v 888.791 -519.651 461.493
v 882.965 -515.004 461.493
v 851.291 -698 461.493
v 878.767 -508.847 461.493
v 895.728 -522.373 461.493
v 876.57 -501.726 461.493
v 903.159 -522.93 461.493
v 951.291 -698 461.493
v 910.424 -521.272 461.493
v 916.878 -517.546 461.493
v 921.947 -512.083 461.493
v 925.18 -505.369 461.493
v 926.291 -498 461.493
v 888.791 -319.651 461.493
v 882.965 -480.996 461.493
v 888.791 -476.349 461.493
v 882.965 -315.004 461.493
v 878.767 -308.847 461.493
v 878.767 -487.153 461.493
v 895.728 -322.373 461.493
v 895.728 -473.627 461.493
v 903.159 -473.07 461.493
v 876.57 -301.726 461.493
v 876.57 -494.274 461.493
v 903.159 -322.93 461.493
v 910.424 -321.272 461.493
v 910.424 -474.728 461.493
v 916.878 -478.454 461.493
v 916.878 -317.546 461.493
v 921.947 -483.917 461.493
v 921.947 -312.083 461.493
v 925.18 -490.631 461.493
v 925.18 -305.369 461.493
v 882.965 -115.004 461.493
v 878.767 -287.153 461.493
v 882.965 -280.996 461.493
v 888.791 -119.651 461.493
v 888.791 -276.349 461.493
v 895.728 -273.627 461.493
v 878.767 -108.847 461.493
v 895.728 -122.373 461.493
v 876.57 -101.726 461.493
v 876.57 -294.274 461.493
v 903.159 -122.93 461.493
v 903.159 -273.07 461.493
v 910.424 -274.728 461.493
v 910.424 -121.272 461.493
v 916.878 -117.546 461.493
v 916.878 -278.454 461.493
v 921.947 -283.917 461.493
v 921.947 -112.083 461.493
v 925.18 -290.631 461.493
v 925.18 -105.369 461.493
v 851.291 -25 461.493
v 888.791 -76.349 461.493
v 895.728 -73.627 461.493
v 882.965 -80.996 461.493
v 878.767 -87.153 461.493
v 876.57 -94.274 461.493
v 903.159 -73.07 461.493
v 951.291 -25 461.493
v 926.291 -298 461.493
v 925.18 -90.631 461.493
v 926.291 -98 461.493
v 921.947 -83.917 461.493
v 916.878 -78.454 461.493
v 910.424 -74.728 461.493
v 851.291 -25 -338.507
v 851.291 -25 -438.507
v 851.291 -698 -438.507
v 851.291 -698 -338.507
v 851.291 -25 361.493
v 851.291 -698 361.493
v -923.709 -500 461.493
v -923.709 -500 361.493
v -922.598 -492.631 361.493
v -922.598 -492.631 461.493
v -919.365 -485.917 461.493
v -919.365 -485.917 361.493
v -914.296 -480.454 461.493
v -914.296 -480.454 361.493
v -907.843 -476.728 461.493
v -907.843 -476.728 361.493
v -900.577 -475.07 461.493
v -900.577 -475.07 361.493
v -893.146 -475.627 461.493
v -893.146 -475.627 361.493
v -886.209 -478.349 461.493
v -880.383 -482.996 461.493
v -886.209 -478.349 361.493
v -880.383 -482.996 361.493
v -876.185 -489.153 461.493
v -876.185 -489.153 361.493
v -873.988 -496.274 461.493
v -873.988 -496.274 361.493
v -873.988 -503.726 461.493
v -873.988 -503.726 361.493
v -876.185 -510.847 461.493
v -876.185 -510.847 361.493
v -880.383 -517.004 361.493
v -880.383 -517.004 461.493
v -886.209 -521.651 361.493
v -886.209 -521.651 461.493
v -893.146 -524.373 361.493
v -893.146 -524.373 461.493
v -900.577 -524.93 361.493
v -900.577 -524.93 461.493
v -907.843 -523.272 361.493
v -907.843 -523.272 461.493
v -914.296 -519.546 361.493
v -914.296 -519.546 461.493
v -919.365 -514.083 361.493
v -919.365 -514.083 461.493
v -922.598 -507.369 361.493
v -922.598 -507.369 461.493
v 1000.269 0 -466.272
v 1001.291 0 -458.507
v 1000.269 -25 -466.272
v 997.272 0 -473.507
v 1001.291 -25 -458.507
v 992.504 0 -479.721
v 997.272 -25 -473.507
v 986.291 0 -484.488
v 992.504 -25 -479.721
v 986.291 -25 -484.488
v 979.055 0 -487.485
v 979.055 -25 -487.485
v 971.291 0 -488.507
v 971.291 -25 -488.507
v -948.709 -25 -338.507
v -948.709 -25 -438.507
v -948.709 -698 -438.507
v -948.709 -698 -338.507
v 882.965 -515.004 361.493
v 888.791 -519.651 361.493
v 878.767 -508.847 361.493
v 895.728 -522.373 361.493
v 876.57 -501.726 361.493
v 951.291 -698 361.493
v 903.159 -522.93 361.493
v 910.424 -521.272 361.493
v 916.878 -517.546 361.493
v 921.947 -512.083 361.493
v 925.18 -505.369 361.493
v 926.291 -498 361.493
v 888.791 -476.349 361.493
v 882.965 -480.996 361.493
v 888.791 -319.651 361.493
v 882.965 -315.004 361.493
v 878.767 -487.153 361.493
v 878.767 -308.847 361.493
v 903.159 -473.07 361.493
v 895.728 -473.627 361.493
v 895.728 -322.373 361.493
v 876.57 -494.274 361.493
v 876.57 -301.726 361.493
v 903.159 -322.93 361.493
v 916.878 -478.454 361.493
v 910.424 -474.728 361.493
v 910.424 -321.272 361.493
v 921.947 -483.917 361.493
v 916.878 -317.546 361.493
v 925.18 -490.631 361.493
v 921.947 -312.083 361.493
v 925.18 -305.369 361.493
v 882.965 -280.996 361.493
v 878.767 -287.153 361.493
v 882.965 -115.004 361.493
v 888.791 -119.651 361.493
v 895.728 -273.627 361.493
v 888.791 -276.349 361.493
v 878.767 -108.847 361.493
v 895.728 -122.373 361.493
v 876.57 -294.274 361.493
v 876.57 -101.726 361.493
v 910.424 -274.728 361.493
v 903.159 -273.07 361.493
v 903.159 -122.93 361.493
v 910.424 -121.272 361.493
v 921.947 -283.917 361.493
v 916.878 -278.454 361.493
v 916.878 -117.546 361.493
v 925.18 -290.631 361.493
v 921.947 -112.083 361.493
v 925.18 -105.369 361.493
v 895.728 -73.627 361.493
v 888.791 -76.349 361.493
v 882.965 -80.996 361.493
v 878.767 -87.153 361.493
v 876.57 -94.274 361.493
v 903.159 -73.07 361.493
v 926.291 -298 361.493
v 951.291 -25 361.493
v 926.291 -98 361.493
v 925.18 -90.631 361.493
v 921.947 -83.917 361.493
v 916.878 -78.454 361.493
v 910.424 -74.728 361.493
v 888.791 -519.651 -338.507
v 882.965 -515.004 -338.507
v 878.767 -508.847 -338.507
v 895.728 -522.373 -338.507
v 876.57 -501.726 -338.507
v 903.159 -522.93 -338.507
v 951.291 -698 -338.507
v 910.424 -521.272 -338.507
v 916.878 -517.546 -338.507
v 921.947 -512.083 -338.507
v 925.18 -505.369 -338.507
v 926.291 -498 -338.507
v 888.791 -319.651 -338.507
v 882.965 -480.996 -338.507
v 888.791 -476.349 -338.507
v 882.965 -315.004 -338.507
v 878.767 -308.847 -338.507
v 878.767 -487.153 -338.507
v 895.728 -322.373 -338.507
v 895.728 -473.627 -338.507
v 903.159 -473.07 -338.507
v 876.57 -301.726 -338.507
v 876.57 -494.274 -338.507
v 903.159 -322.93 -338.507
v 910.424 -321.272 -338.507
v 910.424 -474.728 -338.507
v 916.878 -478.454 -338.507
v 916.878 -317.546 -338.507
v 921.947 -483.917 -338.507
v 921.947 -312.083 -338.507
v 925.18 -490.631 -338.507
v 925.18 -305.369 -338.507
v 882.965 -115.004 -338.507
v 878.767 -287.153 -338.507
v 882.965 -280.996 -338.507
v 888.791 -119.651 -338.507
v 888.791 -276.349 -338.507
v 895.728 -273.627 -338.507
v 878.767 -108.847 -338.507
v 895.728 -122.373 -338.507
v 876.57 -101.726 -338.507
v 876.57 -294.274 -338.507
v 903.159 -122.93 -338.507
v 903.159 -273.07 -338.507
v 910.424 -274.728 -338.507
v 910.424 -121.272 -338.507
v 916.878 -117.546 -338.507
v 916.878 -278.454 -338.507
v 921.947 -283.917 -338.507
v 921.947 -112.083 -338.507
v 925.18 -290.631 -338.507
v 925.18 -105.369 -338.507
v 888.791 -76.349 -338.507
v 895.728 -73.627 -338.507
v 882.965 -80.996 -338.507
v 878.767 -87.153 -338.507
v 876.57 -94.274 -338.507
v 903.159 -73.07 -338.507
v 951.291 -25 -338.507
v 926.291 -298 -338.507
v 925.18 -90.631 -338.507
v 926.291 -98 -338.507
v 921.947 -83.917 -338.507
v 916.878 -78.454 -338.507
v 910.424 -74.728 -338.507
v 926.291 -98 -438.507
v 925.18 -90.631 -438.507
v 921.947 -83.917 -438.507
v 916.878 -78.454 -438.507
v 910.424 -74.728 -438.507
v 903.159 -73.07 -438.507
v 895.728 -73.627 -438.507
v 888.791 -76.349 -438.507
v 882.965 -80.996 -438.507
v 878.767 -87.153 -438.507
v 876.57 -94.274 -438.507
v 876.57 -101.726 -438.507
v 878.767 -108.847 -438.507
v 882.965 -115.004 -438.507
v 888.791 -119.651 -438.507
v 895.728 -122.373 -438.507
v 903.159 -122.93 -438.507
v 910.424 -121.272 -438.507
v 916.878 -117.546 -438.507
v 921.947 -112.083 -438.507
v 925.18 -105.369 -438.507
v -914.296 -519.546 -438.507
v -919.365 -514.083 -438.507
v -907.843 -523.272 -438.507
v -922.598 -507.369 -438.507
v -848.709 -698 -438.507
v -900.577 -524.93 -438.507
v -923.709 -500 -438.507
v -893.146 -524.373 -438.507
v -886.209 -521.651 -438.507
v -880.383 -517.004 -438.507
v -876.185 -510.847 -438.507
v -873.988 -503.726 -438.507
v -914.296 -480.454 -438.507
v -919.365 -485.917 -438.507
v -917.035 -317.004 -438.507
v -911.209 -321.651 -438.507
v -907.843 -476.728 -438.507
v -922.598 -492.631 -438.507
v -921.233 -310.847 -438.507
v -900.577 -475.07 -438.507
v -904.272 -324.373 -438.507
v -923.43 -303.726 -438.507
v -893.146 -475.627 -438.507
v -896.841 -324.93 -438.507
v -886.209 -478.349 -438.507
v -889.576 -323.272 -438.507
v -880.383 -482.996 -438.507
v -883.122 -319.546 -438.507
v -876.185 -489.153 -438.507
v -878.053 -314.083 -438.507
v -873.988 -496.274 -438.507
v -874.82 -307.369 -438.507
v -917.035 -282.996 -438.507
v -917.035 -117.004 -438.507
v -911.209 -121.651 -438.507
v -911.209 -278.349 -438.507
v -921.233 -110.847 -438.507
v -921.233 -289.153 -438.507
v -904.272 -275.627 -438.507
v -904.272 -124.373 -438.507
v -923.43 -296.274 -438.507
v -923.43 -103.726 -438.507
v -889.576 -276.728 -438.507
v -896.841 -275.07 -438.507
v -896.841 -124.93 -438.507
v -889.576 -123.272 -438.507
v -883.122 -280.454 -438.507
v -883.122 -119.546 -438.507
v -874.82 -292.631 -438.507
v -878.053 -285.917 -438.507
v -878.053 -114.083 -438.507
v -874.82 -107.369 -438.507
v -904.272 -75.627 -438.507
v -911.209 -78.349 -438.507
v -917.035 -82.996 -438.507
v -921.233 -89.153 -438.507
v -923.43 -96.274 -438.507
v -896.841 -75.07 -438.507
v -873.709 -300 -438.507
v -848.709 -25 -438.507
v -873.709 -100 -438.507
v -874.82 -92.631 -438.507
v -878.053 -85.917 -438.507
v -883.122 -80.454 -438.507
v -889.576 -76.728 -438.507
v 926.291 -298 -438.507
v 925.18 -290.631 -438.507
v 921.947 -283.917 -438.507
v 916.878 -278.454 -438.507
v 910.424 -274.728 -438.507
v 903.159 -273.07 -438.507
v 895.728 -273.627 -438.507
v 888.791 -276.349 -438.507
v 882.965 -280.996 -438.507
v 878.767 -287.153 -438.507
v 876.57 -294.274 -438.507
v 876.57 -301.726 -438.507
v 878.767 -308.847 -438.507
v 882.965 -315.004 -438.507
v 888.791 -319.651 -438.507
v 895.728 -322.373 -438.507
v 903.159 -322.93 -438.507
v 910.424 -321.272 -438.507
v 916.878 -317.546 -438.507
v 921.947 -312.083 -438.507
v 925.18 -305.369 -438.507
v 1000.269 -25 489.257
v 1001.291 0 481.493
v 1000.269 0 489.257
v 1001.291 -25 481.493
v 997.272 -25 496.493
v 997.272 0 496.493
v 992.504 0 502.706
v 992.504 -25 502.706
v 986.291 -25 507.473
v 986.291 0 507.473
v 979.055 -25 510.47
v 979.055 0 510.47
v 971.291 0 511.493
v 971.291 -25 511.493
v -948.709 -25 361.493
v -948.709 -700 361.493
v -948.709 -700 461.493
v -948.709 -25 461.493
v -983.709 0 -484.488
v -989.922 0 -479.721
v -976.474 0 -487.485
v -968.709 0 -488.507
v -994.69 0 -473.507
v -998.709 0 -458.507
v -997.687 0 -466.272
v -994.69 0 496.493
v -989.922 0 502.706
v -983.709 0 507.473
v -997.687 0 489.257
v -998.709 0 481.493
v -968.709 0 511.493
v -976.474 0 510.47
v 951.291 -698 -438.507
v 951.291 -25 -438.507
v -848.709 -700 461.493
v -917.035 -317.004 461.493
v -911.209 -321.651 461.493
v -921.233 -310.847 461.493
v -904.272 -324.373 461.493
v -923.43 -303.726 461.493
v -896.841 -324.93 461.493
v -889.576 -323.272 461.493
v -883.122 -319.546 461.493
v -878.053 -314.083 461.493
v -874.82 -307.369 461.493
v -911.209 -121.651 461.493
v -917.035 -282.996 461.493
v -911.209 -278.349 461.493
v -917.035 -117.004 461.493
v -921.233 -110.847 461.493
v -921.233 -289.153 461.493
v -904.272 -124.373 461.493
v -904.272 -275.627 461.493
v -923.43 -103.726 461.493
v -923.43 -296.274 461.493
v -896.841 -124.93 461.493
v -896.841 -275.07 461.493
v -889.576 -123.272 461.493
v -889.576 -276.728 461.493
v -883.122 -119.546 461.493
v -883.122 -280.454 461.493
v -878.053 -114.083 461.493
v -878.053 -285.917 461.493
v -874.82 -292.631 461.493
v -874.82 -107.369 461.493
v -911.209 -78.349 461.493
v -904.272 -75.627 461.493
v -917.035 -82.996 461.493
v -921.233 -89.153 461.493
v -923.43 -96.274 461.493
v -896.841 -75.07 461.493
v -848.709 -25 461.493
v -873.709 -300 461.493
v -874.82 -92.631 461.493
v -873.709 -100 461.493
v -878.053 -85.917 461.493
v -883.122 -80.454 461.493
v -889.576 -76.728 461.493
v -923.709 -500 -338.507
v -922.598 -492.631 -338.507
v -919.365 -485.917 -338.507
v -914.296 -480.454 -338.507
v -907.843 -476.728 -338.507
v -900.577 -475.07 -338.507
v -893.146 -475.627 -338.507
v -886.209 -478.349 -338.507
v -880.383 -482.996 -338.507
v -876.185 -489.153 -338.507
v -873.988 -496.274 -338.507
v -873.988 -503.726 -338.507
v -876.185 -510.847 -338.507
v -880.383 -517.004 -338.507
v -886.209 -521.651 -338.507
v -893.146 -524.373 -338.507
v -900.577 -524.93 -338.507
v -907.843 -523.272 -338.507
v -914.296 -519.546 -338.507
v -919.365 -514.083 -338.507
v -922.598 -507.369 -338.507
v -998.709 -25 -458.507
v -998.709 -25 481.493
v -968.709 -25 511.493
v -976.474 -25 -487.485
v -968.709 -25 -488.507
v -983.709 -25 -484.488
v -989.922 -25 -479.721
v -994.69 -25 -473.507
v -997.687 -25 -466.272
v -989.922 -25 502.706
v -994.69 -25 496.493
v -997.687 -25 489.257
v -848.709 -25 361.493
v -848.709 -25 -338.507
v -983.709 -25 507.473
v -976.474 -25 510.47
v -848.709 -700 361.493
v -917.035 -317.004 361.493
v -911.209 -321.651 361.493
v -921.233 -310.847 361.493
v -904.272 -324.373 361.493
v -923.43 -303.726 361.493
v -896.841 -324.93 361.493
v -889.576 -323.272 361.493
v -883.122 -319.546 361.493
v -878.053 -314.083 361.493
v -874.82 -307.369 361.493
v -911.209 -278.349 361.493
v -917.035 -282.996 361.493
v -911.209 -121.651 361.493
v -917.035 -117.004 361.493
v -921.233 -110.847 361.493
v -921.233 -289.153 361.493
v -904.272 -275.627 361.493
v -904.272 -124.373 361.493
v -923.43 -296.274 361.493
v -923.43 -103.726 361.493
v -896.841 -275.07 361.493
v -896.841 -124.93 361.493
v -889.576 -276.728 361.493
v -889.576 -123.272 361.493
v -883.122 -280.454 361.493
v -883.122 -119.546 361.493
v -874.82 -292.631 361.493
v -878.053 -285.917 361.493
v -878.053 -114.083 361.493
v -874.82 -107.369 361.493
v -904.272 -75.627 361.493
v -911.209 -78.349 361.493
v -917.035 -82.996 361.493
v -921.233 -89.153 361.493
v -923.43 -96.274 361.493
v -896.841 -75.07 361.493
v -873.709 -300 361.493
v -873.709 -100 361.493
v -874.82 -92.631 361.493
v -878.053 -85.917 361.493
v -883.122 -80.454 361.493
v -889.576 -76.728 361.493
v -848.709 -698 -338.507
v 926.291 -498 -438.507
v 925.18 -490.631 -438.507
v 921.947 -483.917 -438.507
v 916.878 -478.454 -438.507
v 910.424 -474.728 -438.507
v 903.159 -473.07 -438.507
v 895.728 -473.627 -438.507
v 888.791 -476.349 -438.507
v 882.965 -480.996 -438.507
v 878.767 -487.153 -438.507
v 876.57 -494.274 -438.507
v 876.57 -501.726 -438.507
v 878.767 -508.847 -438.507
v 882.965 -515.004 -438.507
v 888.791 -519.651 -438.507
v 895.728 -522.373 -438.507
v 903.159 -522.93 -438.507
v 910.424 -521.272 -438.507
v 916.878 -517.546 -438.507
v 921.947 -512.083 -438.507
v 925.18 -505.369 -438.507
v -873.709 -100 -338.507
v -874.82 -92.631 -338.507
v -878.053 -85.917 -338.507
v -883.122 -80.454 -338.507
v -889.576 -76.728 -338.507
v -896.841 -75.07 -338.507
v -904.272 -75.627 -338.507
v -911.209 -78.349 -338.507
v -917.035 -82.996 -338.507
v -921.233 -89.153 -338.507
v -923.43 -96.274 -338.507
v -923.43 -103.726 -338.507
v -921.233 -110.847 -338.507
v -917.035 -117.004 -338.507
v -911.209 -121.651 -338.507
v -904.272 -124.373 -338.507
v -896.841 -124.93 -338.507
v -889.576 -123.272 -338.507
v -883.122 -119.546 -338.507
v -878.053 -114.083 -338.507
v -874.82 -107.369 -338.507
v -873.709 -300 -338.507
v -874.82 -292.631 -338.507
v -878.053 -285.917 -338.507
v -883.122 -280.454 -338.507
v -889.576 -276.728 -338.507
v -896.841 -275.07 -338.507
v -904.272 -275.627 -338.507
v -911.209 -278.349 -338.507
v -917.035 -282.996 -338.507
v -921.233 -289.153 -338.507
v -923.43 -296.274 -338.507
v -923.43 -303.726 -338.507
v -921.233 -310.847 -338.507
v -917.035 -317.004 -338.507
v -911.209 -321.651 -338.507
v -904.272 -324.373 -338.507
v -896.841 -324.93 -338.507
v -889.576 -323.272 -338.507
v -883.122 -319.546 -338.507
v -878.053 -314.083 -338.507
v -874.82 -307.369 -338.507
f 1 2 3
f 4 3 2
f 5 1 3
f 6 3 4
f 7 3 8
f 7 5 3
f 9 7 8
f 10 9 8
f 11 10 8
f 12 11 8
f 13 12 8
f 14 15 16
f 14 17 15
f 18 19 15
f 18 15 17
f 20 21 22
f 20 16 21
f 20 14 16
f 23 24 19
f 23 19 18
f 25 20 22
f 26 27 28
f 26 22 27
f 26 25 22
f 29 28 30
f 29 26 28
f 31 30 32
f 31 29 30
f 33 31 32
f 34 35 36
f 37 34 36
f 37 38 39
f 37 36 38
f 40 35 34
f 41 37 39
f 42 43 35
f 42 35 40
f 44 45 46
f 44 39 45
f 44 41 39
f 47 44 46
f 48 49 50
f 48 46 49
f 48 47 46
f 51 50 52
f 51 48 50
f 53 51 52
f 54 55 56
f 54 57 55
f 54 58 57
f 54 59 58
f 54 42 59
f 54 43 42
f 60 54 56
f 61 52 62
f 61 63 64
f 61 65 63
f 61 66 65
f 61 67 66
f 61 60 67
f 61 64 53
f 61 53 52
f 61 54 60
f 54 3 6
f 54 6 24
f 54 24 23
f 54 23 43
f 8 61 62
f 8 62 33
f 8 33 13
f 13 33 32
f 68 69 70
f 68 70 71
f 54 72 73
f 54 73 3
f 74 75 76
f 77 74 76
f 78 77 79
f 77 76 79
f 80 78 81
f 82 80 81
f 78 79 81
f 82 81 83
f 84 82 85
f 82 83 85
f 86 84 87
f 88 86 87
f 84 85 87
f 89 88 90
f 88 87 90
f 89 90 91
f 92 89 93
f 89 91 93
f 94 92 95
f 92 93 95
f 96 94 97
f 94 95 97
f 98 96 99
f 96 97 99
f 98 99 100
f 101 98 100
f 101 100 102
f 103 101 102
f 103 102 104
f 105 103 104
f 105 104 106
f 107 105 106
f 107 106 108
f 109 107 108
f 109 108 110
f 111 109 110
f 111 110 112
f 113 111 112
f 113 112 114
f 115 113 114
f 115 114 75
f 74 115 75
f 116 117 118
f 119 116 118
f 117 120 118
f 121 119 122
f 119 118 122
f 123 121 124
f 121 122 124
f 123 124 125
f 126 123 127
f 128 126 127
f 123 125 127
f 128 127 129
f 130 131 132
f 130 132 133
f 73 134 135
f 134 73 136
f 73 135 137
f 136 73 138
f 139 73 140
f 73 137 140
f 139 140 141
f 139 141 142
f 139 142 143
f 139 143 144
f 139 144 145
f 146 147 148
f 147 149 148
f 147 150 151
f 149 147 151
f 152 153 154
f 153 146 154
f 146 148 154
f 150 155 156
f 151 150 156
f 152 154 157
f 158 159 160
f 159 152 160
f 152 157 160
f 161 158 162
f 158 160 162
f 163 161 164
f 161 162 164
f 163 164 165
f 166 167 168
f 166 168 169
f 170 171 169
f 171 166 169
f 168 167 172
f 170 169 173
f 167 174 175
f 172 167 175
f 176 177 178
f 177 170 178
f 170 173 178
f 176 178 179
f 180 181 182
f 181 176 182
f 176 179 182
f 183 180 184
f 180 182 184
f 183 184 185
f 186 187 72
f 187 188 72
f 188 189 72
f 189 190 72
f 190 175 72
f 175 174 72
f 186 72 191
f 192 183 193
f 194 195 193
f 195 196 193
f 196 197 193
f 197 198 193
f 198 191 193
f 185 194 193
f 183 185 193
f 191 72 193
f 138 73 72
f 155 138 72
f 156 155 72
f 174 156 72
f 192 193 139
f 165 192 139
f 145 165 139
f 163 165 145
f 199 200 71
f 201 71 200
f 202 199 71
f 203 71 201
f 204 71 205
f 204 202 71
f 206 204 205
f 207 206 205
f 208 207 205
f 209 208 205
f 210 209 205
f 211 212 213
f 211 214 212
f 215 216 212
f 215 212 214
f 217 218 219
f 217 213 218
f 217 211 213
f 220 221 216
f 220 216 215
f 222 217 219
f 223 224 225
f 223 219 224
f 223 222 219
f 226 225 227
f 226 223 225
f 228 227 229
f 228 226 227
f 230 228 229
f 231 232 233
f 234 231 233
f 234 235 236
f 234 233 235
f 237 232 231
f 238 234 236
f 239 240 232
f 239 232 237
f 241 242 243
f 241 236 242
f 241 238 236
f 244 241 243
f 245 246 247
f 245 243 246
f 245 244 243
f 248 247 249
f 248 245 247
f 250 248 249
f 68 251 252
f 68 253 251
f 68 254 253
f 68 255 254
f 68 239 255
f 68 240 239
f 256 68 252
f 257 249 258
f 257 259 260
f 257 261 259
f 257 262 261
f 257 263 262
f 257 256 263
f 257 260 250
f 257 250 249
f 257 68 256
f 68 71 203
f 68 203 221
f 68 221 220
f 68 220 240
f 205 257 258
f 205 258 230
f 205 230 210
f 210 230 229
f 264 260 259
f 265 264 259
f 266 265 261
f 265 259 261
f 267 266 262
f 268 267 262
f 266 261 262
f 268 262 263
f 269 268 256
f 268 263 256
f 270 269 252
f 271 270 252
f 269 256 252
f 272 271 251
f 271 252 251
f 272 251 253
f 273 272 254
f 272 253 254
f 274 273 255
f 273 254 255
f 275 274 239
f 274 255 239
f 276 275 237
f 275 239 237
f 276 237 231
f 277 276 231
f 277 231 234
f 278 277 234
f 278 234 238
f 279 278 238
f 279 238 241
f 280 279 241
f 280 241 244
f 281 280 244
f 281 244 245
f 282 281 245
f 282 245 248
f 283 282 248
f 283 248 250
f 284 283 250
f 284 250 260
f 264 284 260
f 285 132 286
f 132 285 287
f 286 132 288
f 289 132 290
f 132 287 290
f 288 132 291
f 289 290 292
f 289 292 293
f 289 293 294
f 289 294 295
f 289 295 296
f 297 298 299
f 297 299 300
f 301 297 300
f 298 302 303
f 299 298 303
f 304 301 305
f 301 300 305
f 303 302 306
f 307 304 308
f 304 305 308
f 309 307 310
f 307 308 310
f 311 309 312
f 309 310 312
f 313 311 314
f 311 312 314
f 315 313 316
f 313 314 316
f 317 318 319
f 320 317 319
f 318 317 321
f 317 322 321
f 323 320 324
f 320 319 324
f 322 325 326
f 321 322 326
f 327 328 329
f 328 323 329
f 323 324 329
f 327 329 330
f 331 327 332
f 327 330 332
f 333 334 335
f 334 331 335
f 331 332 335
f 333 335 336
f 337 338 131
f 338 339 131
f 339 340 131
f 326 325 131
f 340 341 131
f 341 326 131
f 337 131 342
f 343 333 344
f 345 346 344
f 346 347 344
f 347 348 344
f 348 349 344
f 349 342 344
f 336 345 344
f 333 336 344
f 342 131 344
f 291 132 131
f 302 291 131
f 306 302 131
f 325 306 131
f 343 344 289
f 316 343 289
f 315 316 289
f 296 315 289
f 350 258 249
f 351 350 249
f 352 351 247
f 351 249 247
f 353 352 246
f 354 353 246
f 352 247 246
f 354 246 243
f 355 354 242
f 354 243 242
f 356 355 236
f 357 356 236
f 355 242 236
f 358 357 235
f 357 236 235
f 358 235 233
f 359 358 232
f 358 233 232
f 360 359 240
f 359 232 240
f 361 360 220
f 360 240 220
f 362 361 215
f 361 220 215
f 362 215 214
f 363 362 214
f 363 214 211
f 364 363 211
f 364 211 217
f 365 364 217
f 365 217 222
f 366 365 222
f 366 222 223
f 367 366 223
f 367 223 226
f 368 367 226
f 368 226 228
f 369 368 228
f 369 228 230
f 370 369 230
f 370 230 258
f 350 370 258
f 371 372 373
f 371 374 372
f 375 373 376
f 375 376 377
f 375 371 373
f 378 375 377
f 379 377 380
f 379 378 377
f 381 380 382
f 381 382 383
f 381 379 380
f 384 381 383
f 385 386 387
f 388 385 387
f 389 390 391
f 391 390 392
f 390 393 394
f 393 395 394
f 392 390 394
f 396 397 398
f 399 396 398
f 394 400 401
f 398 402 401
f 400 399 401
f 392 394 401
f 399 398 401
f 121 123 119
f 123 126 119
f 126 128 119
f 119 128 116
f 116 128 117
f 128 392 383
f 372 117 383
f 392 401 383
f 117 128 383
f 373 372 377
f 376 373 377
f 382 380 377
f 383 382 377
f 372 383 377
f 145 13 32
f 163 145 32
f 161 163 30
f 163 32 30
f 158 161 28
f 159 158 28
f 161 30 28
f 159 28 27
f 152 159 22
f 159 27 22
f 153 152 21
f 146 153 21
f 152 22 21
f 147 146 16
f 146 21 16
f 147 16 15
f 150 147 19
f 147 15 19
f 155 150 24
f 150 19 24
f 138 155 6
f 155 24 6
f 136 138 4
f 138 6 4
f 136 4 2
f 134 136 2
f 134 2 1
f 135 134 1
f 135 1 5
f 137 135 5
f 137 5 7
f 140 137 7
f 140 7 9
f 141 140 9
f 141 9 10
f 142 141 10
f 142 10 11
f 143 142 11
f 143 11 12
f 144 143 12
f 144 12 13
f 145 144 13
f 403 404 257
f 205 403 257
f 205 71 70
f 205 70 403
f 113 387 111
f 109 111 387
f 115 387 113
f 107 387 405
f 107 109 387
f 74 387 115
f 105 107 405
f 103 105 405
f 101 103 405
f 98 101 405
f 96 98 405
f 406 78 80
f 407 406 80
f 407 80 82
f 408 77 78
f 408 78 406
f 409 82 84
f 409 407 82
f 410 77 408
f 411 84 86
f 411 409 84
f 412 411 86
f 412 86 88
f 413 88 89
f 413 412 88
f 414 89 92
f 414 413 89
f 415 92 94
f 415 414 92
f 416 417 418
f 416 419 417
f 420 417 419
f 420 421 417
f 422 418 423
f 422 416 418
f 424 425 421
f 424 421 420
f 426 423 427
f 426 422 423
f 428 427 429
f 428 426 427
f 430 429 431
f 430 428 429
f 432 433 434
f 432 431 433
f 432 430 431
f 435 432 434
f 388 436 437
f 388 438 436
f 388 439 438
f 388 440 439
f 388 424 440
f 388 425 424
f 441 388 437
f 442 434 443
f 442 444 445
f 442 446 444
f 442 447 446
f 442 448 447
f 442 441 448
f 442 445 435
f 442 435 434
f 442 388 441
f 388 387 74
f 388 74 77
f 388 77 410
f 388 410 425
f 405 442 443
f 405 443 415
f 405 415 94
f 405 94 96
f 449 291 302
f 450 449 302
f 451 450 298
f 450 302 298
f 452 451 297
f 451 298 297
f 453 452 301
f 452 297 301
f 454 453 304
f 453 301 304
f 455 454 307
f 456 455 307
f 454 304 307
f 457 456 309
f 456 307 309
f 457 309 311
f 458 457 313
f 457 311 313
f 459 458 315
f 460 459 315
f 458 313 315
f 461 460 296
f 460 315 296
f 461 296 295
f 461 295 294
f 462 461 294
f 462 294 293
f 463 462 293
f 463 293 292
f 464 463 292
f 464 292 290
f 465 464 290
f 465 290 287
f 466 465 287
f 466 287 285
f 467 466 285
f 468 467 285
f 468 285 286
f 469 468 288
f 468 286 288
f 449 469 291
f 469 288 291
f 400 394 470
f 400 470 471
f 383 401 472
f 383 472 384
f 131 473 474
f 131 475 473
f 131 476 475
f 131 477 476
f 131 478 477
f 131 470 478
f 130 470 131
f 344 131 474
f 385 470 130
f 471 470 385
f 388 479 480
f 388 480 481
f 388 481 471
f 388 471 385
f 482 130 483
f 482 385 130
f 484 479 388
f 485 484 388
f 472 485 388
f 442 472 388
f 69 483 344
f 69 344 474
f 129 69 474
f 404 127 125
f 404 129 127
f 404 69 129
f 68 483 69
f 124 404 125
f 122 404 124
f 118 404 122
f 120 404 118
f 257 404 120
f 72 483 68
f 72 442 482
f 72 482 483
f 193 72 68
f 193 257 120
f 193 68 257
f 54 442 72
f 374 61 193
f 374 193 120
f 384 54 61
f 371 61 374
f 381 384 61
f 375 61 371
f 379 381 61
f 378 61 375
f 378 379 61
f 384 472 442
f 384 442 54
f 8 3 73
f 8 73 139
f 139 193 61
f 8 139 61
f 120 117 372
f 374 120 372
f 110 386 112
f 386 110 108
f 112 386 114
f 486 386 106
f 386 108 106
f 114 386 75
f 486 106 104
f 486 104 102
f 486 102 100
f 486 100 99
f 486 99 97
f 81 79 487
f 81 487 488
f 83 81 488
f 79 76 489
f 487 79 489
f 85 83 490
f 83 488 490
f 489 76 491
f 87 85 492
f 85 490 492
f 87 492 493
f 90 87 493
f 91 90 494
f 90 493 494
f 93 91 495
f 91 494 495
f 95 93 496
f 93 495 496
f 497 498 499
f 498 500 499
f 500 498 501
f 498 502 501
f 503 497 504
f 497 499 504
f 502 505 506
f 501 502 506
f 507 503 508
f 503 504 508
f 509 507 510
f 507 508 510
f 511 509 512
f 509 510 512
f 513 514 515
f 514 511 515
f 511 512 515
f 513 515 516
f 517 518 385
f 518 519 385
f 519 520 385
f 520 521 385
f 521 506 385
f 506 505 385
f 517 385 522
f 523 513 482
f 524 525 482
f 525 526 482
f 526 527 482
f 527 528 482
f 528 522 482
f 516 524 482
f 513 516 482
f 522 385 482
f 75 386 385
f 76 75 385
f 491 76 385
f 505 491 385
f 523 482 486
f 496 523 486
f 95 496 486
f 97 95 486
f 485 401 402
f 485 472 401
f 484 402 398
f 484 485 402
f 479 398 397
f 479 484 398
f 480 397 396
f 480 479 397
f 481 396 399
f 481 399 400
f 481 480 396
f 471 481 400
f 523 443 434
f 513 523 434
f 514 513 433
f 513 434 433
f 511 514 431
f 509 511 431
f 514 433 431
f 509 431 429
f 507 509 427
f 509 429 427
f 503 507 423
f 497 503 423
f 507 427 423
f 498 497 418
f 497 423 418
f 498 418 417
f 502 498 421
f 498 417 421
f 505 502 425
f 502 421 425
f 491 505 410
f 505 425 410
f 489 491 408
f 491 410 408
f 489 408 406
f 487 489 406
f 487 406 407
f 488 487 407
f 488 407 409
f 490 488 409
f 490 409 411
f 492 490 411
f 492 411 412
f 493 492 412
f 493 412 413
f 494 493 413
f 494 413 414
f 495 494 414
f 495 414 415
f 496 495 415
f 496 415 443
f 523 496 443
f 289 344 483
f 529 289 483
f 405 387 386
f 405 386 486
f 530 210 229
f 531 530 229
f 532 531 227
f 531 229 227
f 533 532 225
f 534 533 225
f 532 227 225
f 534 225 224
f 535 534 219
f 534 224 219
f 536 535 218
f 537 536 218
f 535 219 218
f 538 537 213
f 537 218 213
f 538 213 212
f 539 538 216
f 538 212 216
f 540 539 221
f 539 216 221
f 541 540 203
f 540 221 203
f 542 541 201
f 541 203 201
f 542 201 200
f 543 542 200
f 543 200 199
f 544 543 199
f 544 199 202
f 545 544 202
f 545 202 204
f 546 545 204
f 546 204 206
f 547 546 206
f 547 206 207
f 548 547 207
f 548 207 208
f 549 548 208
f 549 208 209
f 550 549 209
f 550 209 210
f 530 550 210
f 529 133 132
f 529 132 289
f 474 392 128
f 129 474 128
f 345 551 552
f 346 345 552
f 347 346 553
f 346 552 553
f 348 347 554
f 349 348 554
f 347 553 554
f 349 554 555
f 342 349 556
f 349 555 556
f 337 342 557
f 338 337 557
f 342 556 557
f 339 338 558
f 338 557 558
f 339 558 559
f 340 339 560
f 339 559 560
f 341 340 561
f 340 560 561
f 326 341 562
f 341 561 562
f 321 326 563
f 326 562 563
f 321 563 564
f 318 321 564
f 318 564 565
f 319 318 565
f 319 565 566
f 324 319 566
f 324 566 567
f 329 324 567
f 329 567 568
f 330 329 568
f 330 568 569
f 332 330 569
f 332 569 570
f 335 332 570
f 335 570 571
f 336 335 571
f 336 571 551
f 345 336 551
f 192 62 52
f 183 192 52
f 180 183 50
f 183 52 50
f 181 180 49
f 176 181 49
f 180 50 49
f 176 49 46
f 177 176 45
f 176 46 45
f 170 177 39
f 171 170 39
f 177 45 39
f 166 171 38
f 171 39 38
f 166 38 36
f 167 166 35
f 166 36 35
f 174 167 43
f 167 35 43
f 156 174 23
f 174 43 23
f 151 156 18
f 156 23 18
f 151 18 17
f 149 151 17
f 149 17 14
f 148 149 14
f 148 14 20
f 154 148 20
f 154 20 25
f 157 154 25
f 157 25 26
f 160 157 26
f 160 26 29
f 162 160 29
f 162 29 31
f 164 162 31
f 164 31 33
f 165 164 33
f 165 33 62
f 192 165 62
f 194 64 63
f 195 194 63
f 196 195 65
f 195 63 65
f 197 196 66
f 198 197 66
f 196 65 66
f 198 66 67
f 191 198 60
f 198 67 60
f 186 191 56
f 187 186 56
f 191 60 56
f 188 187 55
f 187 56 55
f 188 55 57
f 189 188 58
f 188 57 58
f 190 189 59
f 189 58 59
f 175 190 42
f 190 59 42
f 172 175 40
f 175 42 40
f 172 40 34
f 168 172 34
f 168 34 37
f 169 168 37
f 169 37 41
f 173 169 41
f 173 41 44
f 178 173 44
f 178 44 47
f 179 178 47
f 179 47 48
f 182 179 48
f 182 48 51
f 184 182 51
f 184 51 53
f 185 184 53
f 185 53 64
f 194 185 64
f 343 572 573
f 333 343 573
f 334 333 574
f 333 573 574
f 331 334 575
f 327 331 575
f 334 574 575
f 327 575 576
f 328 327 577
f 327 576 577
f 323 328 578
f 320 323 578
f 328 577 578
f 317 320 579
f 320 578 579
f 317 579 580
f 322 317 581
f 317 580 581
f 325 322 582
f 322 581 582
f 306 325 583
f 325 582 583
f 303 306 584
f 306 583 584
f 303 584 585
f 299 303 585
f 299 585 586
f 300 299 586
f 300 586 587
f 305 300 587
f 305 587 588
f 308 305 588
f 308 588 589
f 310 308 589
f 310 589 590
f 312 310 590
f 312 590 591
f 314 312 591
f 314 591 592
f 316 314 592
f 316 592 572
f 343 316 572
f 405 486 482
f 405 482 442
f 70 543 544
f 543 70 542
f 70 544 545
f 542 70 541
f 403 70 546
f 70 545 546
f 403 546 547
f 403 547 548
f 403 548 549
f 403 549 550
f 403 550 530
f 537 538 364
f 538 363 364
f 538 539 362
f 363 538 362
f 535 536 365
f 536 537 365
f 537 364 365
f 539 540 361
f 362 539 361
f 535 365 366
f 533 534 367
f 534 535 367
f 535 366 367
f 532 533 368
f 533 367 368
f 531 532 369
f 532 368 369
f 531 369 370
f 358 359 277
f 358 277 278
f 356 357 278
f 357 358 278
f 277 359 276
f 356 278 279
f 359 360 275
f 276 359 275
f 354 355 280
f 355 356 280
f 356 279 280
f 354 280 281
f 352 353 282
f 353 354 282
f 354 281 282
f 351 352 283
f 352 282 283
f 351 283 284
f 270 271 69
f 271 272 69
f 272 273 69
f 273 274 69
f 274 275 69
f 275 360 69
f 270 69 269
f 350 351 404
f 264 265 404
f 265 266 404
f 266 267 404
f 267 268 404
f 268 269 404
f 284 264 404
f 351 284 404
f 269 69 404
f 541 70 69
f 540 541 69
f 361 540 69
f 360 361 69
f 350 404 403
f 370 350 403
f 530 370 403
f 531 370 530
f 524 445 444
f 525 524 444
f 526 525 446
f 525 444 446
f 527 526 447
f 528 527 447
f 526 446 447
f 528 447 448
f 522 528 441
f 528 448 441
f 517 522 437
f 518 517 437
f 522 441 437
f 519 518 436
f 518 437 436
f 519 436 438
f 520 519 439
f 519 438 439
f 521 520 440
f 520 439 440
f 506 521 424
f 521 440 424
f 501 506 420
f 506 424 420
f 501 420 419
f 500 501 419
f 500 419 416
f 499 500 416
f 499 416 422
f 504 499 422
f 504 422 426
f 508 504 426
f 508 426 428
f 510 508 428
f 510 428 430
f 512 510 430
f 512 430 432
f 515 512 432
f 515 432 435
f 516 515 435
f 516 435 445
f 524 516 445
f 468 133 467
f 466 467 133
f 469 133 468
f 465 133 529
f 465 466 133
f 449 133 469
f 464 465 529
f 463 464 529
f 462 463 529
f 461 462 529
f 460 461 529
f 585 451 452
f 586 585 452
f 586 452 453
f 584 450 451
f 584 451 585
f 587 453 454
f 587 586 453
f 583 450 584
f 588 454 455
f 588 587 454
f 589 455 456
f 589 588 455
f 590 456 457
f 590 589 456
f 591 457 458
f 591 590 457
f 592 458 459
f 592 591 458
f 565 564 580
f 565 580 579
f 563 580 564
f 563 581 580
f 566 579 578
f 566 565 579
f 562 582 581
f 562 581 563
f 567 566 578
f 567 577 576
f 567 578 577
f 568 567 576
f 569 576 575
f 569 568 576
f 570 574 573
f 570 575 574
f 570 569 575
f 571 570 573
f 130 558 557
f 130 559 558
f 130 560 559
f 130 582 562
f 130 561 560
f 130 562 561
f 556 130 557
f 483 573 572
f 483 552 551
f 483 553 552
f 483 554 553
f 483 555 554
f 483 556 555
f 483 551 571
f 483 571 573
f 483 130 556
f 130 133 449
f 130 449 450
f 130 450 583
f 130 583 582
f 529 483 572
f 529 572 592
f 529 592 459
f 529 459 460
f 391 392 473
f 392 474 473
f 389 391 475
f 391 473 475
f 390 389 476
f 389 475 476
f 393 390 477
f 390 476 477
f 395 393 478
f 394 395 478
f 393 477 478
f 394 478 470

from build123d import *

# Parameters (mm, degrees)
F0_W      = 2000
F0_H      = 1000
F1_DEPTH  = 25
F2_W      = 100
F2_H      = 100
F3_DEPTH  = 700
F5_W      = 100
F5_H      = 100
F6_DEPTH  = 673
F7_D      = 50
F8_R      = 25
F9_DEPTH  = 25
F9_FACE_R = 25
F10_DEPTH = 975.001
F11_R     = 30


with BuildPart() as f1:
    # F0 (on Front) → F1 (new body)
    with BuildSketch(Plane.XZ):
        with Locations((1.290835, 11.492619)):
            Rectangle(F0_W, F0_H)
    extrude(amount=F1_DEPTH)

    # F2 (on Front) → F3 (join)
    with BuildSketch(Plane.XZ):
        with Locations((-898.709165, 411.492619)):
            Rectangle(F2_W, F2_H)
    extrude(amount=F3_DEPTH)

    # F5 (on face) → F6 (join)
    with BuildSketch(Plane.XZ.offset(25)):
        with Locations((-898.709165, -388.507381)):
            Rectangle(F5_W, F5_H)
        with Locations((901.290835, -388.507381)):
            Rectangle(F5_W, F5_H)
        with Locations((901.290835, 411.492619)):
            Rectangle(F5_W, F5_H)
    extrude(amount=F6_DEPTH)

    # F7 (through all)
    with Locations(Plane.XY.offset(461.492619)):
        with Locations((-898.709165, -500)):
            Hole(F7_D / 2)

    # F8 (on face) → F9 (join)
    with BuildSketch(Plane.XY.offset(461.492619)):
        with Locations((-898.709165, -300)):
            Circle(F8_R)
        with Locations((-898.709165, -100)):
            Circle(F8_R)
        with Locations((-898.709165, -500)):
            Circle(F8_R)
        with Locations((901.290835, -498)):
            Circle(F8_R)
        with Locations((901.290835, -298)):
            Circle(F8_R)
        with Locations((901.290835, -98)):
            Circle(F8_R)
    extrude(amount=F9_DEPTH)

    # F9_face (on face) → F10 (cut, through all)
    with BuildSketch(Plane(origin=(-898.709165, -300, 486.492619), x_dir=(1, 0, 0), z_dir=(0, 0, 1))):
        Circle(F9_FACE_R)
        with Locations((0, 200)):
            Circle(F9_FACE_R)
        with Locations((0, -200)):
            Circle(F9_FACE_R)
        with Locations((1800, 202)):
            Circle(F9_FACE_R)
        with Locations((1800, 2)):
            Circle(F9_FACE_R)
        with Locations((1800, -198)):
            Circle(F9_FACE_R)
    extrude(amount=-F10_DEPTH, mode=Mode.SUBTRACT)

    # F11
    f11_edges = [f1.edges().sort_by_distance(p)[0] for p in [
        (-998.709165, -12.5, 511.492619),
        (-998.709165, -12.5, -488.507381),
        (1001.290835, -12.5, -488.507381),
        (1001.290835, -12.5, 511.492619),
    ]]
    fillet(f11_edges, radius=F11_R)


solid = f1.part
